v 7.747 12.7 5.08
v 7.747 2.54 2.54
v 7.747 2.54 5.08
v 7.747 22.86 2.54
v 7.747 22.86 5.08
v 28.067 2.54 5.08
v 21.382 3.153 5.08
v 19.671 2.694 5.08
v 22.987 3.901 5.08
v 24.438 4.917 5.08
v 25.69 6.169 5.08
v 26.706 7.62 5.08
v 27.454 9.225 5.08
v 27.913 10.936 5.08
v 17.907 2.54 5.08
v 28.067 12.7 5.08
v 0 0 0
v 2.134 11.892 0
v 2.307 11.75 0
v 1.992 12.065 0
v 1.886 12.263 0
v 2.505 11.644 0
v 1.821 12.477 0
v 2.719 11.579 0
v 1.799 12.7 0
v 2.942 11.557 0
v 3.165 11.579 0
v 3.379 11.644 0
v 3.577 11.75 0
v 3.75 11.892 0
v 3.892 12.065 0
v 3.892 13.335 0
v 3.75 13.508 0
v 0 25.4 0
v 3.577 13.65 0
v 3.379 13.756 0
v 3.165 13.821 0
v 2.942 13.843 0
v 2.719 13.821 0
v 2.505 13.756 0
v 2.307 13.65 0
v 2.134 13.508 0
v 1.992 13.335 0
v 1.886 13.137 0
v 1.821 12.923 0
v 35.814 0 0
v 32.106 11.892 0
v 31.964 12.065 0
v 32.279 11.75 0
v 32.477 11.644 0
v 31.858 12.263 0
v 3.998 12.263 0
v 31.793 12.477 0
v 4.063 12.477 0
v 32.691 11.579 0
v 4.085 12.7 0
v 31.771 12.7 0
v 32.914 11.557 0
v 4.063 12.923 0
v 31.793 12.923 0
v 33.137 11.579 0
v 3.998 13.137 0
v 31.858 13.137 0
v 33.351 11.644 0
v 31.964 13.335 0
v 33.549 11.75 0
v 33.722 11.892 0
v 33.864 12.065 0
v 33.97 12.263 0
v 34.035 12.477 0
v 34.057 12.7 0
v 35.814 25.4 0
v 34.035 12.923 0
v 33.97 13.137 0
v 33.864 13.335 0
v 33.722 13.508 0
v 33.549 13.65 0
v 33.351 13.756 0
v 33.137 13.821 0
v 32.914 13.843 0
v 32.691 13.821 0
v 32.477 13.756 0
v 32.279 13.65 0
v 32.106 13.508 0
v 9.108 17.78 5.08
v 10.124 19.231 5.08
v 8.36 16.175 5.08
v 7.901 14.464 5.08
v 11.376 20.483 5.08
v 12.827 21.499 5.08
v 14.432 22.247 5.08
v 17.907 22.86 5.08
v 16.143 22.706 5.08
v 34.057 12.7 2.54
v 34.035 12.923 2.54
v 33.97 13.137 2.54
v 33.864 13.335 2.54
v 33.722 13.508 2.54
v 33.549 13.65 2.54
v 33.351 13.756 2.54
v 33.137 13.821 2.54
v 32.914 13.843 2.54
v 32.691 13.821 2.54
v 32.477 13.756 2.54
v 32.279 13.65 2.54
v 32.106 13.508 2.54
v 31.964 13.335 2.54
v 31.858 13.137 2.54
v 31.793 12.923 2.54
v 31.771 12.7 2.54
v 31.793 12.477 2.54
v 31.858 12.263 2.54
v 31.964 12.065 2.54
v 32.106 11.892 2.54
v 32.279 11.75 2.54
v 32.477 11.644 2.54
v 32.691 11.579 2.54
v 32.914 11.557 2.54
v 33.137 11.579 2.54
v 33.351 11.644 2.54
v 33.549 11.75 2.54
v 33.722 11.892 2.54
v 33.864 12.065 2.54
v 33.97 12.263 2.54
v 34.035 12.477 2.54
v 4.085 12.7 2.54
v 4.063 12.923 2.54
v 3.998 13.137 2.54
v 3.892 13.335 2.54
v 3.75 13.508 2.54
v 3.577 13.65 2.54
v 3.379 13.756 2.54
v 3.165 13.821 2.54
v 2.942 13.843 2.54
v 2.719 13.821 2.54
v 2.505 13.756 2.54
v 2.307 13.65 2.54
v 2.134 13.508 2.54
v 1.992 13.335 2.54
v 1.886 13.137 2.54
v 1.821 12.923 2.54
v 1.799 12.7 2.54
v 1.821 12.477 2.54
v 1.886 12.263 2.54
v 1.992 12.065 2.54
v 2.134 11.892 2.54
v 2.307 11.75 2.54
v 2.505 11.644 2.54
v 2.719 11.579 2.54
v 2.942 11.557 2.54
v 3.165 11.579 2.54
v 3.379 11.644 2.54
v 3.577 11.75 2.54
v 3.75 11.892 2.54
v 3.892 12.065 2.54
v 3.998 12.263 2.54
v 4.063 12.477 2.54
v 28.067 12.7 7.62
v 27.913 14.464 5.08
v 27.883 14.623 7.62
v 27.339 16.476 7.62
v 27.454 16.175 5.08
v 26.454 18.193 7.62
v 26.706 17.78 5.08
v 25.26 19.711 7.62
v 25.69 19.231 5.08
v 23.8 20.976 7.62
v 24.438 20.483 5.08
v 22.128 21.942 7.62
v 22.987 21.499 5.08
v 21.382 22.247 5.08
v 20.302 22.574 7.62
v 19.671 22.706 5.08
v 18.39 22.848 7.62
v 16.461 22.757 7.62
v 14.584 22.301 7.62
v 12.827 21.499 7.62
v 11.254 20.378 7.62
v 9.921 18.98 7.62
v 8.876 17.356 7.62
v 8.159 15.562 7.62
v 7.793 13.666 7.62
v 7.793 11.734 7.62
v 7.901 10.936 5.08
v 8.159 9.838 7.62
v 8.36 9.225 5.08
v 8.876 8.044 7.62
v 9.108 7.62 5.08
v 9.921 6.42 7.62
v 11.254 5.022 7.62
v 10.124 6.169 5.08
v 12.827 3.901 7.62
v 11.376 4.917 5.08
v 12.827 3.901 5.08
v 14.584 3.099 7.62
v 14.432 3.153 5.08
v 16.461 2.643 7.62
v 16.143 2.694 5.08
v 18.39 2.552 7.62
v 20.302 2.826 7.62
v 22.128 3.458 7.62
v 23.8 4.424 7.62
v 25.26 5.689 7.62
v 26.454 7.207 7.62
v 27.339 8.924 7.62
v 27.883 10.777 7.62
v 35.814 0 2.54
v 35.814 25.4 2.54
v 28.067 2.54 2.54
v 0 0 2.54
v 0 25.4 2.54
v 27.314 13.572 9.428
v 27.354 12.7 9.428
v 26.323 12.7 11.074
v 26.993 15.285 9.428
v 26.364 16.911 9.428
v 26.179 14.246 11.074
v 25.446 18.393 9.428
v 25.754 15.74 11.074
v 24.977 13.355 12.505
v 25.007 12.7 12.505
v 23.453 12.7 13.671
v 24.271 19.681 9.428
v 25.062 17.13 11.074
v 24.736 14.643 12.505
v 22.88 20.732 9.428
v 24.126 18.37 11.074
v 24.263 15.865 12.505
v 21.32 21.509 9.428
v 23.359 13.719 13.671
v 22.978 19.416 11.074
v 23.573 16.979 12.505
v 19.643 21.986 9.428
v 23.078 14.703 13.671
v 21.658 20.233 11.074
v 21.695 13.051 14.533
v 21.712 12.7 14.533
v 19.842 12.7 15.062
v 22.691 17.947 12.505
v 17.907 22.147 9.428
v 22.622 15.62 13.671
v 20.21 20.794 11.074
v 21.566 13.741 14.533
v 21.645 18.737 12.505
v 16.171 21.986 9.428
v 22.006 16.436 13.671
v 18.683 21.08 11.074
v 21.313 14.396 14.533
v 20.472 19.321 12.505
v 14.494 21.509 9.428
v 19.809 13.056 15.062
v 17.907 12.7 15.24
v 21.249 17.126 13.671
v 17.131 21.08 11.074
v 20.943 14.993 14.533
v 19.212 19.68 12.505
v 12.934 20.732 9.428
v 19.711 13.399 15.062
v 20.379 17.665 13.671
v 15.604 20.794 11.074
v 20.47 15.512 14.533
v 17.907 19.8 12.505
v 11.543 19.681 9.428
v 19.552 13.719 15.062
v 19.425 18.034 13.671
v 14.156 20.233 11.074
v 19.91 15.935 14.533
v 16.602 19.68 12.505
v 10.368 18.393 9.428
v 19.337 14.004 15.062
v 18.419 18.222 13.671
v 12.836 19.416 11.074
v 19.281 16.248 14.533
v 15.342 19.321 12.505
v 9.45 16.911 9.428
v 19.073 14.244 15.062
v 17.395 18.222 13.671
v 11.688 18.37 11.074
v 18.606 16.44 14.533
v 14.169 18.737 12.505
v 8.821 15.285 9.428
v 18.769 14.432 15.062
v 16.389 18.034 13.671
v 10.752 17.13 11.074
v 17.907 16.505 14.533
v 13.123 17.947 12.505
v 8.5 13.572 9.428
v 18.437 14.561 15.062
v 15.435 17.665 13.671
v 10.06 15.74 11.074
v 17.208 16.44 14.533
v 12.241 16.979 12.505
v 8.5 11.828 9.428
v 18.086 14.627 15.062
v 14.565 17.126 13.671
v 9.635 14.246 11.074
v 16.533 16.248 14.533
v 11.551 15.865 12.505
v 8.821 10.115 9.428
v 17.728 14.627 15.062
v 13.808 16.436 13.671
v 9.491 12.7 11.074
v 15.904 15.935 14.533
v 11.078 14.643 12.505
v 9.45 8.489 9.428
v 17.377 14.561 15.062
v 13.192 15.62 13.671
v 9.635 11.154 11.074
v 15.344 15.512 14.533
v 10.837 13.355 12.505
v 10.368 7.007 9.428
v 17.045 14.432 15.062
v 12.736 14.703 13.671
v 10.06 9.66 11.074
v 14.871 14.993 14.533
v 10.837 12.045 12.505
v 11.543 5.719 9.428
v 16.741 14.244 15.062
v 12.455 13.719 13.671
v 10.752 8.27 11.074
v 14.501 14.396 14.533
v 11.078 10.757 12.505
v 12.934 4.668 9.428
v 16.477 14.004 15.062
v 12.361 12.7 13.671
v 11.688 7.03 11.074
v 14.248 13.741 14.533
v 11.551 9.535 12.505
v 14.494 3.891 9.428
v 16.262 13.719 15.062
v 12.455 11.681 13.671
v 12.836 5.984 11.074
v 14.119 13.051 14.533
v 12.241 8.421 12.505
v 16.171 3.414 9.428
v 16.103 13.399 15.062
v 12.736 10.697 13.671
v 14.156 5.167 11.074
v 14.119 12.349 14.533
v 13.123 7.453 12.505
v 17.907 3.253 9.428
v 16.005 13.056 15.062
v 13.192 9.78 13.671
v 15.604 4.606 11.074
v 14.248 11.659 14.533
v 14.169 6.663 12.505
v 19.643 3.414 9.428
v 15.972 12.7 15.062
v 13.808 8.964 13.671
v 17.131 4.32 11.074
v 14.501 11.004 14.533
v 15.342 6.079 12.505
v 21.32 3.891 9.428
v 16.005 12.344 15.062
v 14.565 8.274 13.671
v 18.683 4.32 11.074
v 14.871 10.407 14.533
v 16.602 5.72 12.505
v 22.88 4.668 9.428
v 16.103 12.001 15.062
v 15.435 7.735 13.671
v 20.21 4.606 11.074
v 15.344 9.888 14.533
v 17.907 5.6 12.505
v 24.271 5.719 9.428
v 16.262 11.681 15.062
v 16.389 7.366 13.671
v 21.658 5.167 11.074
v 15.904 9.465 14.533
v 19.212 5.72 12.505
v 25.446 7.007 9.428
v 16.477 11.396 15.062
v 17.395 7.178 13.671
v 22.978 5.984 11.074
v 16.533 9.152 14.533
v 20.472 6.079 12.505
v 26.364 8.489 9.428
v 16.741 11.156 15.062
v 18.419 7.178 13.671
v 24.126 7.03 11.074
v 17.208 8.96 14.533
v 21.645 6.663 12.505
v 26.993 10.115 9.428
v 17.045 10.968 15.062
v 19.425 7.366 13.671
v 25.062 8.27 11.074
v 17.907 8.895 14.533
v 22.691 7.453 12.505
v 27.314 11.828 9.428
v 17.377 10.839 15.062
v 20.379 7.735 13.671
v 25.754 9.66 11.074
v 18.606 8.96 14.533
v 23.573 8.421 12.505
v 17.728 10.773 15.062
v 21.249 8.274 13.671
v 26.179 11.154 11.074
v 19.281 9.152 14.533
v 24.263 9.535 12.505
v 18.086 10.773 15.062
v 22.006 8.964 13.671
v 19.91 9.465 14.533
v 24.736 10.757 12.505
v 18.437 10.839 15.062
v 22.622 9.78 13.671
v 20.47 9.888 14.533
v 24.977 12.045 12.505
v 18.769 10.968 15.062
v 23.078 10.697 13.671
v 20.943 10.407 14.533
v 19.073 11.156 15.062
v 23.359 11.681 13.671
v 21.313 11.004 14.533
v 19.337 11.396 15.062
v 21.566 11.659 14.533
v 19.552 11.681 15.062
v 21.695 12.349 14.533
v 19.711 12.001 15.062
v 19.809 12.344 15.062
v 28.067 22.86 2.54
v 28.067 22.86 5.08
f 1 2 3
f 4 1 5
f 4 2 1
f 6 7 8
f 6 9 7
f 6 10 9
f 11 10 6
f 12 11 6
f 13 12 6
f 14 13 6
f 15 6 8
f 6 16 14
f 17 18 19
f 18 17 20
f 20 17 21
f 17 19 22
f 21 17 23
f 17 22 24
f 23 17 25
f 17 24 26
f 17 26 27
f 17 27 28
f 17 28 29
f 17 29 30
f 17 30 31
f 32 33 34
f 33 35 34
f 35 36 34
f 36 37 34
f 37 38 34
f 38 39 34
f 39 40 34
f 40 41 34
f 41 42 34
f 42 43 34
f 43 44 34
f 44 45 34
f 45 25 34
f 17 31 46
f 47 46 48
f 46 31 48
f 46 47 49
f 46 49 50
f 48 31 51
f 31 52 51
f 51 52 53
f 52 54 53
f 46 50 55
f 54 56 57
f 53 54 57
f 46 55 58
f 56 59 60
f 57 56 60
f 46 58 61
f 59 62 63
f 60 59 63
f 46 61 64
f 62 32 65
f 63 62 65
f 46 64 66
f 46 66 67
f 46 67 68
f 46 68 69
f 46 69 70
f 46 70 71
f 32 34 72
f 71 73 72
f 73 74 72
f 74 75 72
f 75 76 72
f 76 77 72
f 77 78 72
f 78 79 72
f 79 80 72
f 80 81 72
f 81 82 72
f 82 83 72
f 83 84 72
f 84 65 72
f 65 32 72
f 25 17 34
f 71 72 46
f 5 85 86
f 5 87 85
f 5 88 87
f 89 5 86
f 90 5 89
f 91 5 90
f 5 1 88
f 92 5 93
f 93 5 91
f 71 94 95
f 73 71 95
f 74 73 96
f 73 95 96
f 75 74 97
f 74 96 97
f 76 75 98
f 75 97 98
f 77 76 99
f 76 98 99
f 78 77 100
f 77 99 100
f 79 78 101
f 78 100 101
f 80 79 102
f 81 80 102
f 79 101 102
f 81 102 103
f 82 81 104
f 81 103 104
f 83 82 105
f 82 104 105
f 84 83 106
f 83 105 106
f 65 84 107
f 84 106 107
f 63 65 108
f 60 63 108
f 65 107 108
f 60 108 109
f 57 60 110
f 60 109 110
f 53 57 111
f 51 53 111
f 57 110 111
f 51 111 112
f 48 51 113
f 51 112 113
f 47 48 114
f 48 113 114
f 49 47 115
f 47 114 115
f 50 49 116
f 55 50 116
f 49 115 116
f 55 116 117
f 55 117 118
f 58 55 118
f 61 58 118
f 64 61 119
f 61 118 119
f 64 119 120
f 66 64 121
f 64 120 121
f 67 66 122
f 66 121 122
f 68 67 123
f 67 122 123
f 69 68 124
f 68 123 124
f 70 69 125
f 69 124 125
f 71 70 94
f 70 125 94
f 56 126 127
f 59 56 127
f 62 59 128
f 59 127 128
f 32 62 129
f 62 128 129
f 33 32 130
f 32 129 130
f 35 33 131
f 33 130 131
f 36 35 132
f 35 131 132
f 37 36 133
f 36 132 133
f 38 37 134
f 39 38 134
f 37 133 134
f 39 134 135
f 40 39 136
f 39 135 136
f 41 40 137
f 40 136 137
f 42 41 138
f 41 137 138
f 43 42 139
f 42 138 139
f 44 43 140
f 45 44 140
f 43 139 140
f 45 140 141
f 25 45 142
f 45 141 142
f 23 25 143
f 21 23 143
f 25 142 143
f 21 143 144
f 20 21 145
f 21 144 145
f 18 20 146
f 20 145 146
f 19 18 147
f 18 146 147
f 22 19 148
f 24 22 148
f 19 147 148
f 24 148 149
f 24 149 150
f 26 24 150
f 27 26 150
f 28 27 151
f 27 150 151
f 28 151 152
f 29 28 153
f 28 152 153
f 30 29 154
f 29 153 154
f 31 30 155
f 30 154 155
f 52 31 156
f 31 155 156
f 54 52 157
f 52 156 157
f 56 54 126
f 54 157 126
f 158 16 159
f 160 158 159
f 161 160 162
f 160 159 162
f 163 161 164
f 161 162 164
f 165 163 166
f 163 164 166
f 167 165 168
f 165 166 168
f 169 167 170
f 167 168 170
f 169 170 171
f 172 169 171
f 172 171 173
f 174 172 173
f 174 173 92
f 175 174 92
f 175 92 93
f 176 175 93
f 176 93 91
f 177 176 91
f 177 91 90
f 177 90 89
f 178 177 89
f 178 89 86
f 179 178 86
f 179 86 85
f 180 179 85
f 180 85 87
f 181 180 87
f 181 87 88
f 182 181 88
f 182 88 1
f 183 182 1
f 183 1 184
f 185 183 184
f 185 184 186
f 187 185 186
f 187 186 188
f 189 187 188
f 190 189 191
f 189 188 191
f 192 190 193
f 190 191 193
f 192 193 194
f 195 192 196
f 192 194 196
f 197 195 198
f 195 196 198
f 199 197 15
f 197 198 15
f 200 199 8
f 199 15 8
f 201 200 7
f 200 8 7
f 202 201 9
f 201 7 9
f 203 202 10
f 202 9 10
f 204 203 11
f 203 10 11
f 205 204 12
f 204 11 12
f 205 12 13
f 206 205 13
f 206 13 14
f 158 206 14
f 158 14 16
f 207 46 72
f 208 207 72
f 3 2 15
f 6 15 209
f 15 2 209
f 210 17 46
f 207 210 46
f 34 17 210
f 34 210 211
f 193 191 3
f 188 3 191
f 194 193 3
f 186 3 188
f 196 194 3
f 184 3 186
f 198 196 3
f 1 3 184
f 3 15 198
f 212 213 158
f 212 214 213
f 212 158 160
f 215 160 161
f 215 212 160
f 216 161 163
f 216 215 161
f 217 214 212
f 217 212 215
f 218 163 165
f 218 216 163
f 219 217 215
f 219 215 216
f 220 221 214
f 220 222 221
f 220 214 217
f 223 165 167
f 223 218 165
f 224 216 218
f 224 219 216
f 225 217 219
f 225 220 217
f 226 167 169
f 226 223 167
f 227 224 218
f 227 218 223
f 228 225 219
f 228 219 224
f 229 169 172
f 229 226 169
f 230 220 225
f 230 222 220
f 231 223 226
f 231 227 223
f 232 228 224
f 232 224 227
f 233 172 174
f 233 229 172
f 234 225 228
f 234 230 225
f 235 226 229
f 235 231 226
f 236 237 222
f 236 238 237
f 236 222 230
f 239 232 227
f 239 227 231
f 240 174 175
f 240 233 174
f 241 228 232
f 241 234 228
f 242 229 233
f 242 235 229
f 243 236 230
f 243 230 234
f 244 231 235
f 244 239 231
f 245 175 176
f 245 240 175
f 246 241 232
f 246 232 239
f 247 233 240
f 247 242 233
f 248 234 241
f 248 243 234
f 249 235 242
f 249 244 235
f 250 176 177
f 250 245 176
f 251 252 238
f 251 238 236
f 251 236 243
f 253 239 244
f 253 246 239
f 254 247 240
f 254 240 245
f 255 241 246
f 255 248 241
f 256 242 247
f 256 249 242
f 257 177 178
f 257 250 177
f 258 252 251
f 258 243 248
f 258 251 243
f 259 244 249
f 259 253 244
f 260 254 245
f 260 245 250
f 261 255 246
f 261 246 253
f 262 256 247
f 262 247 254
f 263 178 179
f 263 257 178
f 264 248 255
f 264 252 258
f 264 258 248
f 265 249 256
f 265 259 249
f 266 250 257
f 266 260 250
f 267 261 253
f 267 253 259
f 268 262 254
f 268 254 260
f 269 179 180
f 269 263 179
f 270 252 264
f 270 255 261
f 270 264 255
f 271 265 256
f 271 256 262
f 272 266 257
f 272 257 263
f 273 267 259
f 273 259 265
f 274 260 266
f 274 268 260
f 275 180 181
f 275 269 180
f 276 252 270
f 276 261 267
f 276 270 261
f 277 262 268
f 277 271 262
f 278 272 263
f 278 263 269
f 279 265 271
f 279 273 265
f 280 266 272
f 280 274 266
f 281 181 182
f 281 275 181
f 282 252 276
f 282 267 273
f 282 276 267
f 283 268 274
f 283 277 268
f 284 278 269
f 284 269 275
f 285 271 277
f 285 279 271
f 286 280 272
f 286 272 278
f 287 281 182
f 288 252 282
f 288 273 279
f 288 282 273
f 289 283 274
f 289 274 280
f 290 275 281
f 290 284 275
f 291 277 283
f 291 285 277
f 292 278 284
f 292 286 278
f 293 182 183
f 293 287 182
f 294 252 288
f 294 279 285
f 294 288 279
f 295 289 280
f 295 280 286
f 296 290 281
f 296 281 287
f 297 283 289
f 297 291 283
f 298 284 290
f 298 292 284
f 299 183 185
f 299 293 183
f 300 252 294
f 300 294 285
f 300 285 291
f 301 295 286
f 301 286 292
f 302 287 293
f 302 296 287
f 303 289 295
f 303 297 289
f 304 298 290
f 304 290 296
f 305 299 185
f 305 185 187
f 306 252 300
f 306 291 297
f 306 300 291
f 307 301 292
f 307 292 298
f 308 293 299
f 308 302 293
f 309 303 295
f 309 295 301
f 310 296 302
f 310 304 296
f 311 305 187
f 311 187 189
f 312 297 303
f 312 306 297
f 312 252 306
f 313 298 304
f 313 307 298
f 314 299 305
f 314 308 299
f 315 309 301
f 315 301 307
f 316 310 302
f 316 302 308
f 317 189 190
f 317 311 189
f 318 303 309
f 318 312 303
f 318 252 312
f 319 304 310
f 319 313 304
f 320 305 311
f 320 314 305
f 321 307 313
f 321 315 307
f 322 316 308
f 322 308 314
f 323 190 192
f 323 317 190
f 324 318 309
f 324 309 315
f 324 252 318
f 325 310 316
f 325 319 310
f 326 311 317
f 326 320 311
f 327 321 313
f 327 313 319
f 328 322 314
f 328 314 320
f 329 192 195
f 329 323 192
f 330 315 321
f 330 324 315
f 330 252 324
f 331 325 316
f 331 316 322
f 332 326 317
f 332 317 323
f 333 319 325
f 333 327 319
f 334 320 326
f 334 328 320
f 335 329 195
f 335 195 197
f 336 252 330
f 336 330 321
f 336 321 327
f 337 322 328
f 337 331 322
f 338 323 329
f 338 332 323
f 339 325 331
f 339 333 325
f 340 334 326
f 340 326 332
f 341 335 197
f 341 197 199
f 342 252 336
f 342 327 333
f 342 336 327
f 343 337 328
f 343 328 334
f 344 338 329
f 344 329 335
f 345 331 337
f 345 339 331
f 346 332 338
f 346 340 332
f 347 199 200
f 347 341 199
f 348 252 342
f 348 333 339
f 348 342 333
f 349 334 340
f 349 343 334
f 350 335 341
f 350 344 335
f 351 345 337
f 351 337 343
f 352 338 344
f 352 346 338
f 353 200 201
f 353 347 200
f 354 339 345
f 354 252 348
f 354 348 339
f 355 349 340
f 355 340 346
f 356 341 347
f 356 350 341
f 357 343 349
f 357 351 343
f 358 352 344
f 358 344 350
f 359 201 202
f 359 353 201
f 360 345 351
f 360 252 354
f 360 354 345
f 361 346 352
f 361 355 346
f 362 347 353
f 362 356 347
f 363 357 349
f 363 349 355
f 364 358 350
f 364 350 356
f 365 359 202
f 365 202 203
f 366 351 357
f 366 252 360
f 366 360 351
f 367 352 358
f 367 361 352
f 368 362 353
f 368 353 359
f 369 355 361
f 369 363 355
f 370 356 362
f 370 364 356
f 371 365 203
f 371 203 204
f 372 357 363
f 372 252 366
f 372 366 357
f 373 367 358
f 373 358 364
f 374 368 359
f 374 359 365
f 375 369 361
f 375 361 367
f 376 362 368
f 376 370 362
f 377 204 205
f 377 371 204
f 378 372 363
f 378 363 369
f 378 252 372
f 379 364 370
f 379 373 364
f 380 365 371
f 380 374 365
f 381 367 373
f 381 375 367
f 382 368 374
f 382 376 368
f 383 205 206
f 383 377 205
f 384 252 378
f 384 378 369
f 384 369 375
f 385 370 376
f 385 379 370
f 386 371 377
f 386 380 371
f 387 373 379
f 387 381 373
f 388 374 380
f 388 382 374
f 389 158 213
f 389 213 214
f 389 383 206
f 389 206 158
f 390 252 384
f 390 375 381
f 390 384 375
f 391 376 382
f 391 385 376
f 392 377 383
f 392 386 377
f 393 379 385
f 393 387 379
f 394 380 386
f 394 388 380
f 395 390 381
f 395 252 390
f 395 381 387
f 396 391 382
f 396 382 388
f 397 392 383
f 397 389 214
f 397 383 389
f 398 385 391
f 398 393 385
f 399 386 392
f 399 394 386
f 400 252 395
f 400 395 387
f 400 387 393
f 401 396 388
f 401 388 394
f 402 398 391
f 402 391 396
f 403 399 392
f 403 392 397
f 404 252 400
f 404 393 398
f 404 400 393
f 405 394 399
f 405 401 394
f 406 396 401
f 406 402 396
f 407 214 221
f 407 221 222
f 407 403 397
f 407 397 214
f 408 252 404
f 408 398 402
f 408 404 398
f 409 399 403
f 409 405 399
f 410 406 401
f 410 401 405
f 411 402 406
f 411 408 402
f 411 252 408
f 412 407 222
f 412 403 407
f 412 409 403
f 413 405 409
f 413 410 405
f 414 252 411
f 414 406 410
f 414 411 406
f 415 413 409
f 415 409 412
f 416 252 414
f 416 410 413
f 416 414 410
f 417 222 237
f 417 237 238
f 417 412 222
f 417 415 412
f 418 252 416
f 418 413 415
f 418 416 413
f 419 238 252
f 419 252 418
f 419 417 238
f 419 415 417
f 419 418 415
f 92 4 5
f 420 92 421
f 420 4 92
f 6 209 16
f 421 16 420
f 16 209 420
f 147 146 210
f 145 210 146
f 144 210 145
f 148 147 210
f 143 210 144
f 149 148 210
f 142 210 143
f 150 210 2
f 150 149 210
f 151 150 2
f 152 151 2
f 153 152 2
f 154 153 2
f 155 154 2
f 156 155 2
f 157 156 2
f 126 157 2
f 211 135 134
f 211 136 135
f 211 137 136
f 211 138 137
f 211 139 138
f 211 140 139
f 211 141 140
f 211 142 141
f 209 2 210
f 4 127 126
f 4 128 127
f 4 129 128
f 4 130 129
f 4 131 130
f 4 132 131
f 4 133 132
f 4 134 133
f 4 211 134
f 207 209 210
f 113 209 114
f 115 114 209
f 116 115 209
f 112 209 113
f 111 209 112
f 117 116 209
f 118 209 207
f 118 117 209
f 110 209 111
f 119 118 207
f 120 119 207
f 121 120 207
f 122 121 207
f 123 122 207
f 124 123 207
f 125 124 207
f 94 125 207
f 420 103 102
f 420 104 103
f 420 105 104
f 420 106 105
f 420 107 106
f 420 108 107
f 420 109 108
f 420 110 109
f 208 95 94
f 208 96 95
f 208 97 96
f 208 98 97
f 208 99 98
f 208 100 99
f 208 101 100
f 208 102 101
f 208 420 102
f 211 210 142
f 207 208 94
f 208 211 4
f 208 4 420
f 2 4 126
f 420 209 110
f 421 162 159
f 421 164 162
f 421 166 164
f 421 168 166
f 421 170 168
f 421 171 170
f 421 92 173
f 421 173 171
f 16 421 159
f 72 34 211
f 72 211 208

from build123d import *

# Parameters (mm, degrees)
SKETCH1_W           = 35.814
SKETCH1_H           = 25.4
BOSS_EXTRUDE1_DEPTH = 2.54
SKETCH2_R           = 1.143
CUT_EXTRUDE1_DEPTH  = 2.54
SKETCH3_W           = 20.32
SKETCH3_H           = 20.32
BOSS_EXTRUDE3_DEPTH = 2.54
SKETCH4_R           = 10.16
BOSS_EXTRUDE4_DEPTH = 2.54
DOME3_FACE_RADIUS   = 10.16
DOME3_HEIGHT        = 7.62


with BuildPart() as part:
    # Sketch1 → Boss-Extrude1 (new body)
    with BuildSketch(Plane.XY):
        with Locations((17.907, 12.7)):
            Rectangle(SKETCH1_W, SKETCH1_H)
    extrude(amount=BOSS_EXTRUDE1_DEPTH)

    # Sketch2 → Cut-Extrude1 (cut)
    with BuildSketch(Plane.XY.offset(2.54)):
        with Locations((2.942, 12.7)):
            Circle(SKETCH2_R)
        with Locations((32.914, 12.7)):
            Circle(SKETCH2_R)
    extrude(amount=-CUT_EXTRUDE1_DEPTH, mode=Mode.SUBTRACT)

    # Sketch3 → Boss-Extrude3 (add)
    with BuildSketch(Plane.XY.offset(2.54)):
        with Locations((17.907, 12.7)):
            Rectangle(SKETCH3_W, SKETCH3_H)
    extrude(amount=BOSS_EXTRUDE3_DEPTH)

    # Sketch4 → Boss-Extrude4 (add)
    with BuildSketch(Plane.XY.offset(5.08)):
        with Locations((17.907, 12.7)):
            Circle(SKETCH4_R)
    extrude(amount=BOSS_EXTRUDE4_DEPTH)

    # Dome3: a dome of height H over a round flat face of radius A is a cap of a sphere of radius (A * A + H * H) / (2 * H)
    dome3_r = (DOME3_FACE_RADIUS * DOME3_FACE_RADIUS + DOME3_HEIGHT * DOME3_HEIGHT) / (2 * DOME3_HEIGHT)
    dome3_base = Plane((17.907, 12.7, 7.62), z_dir=(0, 0, 1))
    with Locations(dome3_base.offset(DOME3_HEIGHT - dome3_r)):
        dome3_ball = Sphere(dome3_r, mode=Mode.PRIVATE)
    add(split(dome3_ball, bisect_by=dome3_base, keep=Keep.TOP, mode=Mode.PRIVATE))


solid = part.part
